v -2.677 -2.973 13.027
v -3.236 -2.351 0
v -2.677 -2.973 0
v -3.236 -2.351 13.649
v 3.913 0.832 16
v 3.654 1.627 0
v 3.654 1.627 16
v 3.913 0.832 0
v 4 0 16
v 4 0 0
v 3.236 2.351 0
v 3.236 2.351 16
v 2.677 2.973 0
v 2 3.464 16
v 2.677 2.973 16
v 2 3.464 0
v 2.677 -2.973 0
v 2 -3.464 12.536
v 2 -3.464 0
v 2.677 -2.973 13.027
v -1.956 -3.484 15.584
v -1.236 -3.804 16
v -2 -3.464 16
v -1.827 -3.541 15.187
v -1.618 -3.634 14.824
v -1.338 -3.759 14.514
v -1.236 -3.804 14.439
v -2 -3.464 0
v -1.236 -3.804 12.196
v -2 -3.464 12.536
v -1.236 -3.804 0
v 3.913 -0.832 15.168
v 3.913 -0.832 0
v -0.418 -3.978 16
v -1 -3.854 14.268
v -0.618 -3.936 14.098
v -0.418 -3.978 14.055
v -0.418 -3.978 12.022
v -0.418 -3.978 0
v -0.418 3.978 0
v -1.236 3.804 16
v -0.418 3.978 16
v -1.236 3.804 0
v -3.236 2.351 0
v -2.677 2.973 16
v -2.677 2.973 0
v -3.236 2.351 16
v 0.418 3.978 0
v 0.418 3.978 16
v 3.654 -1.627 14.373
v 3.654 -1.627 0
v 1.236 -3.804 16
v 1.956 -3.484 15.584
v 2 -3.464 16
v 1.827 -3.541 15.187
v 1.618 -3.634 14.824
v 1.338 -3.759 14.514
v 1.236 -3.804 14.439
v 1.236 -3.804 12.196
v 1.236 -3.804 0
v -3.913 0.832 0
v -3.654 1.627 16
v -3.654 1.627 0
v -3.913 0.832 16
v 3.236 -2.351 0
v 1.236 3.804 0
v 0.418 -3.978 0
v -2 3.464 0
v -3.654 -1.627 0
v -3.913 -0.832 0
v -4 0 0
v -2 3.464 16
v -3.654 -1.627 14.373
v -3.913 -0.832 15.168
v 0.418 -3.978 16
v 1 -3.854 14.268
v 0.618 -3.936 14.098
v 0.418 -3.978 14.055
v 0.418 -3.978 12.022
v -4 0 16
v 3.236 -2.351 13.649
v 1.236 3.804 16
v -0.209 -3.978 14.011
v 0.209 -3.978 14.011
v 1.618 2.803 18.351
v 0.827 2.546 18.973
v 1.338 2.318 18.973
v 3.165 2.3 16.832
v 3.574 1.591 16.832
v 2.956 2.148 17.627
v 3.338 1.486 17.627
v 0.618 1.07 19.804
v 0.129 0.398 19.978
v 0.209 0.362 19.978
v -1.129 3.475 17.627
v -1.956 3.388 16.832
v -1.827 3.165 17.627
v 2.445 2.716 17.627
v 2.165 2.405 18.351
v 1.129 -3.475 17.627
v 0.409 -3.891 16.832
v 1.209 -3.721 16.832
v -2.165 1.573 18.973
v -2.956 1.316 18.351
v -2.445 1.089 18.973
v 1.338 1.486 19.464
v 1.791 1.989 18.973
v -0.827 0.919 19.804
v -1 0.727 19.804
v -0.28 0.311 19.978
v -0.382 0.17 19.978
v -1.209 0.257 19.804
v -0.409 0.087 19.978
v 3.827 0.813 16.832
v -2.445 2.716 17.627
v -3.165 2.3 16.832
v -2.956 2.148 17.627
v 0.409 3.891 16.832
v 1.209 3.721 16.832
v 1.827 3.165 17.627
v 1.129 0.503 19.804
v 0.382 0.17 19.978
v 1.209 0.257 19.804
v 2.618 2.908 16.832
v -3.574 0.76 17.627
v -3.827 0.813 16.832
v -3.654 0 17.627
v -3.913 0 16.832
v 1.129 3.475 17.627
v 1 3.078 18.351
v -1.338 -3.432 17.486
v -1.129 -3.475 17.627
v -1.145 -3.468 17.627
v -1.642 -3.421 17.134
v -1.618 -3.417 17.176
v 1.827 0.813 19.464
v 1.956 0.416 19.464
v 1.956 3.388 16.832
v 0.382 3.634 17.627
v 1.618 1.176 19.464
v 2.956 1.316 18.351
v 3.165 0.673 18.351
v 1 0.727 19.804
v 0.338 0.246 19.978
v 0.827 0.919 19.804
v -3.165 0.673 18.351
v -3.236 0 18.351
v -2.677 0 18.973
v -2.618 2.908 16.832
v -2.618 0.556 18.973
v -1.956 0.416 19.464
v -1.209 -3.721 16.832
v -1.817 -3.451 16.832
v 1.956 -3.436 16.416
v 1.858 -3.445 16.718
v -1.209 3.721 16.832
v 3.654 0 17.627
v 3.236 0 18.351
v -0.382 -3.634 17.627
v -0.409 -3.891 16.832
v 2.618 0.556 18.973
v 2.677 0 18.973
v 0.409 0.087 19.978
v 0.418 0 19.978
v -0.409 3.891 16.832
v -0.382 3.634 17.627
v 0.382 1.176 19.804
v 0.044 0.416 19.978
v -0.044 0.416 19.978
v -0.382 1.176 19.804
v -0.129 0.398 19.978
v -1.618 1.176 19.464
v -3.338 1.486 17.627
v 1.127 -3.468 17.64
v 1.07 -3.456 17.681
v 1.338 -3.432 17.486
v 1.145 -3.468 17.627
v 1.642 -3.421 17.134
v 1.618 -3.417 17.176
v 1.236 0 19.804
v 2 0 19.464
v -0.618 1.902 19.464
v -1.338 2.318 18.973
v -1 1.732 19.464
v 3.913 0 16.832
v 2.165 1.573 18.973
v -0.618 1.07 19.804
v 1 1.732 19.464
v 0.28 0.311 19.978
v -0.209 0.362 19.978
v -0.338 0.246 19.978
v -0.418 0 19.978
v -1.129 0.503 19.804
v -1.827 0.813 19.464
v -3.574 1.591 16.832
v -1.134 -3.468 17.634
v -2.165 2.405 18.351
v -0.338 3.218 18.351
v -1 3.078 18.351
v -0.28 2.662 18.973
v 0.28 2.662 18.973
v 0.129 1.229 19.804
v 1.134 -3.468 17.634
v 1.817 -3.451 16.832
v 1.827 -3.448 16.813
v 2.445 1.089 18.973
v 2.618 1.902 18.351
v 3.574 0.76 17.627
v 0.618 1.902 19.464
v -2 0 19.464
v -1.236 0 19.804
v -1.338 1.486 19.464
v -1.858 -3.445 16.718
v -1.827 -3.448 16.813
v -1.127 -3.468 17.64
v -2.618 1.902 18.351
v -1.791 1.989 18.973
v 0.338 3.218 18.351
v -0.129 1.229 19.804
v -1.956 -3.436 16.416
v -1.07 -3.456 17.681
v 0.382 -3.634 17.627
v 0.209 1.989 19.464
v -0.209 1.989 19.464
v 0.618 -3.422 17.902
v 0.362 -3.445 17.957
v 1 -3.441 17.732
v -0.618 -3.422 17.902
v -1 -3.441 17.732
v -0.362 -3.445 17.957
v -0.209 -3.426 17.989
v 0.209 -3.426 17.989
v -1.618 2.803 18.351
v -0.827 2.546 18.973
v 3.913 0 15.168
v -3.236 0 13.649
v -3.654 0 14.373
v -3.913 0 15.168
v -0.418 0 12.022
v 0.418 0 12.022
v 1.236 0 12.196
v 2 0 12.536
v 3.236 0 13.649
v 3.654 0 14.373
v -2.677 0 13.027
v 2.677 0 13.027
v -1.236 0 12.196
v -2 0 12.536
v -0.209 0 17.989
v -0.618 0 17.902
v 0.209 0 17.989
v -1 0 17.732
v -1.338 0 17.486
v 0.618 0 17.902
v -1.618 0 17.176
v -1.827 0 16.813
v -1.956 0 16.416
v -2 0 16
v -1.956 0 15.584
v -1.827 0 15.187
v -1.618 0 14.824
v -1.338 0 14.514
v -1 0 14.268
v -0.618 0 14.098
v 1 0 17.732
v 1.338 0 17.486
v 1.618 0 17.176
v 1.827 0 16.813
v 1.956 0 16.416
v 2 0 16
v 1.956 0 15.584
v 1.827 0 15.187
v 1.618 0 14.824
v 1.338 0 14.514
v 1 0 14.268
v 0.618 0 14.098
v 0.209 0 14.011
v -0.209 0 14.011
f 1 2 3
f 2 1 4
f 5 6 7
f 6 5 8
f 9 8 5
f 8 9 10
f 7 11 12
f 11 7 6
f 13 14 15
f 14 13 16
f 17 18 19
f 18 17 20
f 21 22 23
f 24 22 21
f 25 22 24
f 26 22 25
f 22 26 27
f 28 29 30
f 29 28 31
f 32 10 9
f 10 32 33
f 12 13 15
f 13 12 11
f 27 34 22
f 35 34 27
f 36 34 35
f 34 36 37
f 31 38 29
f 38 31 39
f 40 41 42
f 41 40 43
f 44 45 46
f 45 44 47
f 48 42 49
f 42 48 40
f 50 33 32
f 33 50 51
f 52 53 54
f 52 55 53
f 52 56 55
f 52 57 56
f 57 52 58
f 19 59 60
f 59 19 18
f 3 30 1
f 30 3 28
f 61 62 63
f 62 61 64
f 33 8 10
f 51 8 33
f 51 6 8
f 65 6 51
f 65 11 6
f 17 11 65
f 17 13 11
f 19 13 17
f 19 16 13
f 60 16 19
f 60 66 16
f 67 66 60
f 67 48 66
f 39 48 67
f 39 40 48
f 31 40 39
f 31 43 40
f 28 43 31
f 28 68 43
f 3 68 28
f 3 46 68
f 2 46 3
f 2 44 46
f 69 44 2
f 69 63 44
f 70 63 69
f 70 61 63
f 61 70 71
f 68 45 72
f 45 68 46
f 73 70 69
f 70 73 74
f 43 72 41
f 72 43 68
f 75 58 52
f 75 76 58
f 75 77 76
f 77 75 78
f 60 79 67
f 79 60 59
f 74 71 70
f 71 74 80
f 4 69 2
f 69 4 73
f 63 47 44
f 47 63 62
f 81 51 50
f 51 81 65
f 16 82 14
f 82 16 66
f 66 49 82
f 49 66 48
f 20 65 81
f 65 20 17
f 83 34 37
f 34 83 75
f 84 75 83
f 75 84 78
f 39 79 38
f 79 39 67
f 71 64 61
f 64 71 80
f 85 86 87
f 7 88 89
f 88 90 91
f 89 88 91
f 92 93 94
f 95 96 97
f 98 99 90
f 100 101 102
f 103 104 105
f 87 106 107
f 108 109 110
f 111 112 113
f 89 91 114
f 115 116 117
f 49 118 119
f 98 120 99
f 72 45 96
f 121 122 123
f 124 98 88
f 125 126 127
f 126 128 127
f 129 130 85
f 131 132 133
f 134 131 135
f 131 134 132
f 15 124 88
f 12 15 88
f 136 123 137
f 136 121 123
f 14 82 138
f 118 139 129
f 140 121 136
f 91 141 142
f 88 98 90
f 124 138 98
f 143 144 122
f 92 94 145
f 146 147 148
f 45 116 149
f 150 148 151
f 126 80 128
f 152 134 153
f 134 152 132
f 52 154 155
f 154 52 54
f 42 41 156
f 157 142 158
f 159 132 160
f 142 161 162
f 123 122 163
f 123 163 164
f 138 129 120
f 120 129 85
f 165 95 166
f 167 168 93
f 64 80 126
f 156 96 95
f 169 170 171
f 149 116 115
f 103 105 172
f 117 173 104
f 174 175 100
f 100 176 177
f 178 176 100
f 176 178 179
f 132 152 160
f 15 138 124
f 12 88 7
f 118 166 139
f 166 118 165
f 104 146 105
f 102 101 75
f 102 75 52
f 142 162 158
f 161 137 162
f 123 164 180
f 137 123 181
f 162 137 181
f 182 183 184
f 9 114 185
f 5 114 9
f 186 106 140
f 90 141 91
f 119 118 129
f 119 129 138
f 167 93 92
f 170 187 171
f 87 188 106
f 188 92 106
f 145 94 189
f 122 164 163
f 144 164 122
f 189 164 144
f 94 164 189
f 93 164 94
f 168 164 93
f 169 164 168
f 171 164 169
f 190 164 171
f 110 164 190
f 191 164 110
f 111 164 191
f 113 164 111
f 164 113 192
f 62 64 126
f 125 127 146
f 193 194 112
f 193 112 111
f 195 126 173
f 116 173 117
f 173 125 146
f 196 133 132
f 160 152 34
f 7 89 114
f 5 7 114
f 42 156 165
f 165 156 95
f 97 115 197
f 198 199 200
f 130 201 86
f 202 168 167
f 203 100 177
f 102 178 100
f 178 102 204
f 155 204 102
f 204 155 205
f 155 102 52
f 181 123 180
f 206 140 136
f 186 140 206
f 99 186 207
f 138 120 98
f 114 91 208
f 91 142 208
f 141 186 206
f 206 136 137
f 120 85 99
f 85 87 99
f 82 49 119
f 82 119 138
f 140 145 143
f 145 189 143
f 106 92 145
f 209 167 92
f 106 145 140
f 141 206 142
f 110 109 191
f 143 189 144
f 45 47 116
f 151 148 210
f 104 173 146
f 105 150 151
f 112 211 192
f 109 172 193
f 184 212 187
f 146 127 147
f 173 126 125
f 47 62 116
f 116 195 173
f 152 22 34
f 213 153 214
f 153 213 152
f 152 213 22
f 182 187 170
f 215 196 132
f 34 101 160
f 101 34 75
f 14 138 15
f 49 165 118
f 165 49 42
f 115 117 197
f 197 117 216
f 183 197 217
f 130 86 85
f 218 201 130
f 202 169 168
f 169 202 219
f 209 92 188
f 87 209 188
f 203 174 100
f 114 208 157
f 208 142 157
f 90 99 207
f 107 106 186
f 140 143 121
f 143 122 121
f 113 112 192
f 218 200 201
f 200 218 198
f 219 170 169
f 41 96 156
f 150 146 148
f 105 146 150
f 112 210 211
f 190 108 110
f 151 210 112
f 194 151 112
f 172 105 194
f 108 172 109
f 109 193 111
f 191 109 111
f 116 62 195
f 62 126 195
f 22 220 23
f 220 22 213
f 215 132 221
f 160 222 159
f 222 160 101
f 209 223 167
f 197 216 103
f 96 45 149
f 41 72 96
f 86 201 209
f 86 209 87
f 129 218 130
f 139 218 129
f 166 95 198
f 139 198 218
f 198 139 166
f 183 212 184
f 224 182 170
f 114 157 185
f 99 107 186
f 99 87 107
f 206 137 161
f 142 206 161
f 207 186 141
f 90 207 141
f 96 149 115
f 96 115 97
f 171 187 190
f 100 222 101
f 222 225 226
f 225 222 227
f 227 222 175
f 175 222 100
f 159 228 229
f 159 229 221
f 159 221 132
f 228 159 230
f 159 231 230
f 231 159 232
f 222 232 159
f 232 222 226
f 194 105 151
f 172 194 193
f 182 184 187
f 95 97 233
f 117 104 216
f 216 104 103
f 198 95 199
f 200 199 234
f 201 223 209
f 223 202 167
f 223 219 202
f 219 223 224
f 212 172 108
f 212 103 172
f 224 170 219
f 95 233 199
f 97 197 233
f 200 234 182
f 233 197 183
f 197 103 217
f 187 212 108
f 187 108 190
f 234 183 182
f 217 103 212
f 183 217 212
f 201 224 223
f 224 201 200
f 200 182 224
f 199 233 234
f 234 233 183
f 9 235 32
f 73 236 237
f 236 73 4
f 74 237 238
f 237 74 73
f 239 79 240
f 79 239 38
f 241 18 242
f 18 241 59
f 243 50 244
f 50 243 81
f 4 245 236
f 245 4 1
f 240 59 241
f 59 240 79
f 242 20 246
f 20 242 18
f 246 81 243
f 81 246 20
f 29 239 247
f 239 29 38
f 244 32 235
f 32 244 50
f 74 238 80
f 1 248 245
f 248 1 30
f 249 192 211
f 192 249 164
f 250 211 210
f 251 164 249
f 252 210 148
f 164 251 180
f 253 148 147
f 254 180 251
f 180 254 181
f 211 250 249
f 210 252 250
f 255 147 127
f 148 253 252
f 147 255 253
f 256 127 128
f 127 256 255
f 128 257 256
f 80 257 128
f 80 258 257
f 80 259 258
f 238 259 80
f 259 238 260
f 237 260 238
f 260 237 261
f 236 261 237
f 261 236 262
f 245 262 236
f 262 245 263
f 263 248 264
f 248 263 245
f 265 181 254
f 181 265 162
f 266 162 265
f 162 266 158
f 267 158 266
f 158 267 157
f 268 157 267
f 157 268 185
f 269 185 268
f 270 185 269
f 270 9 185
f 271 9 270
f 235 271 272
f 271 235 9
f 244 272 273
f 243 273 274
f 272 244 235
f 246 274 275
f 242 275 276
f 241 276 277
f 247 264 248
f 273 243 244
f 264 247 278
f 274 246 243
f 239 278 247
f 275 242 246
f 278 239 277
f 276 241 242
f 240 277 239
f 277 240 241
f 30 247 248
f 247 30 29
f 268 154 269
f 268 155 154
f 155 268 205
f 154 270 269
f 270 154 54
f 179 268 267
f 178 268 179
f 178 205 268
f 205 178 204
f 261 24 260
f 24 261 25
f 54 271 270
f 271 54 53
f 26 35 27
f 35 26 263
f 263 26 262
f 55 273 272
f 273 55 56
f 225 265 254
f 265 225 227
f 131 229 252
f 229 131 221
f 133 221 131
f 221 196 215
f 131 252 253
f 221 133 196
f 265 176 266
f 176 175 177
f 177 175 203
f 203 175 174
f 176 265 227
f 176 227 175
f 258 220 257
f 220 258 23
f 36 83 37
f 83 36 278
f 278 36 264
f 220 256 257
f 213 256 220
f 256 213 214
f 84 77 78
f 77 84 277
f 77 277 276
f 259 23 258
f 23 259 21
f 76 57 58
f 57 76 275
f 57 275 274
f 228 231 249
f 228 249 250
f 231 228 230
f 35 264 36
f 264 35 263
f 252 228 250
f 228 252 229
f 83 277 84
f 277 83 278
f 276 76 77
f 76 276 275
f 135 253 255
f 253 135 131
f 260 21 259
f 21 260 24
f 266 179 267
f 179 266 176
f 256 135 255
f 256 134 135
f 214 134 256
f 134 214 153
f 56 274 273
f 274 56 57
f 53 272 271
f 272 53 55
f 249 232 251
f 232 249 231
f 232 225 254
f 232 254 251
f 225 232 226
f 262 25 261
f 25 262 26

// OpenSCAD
$fn = 30;

module mould_void(inner_radius = 2, outer_radius = 4, length = 20) {
    difference() {
        union() {
            cylinder(r = outer_radius, h = length - outer_radius, $fn = $fn);
            translate([0,0, length - outer_radius]) {
                sphere(r = outer_radius, $fn = $fn);
            }
        }
        translate([0, 0, length - outer_radius]) rotate([90, 0, 0]) {
            difference() {
                cylinder(r = outer_radius, h = outer_radius);
                cylinder(r = inner_radius, h = outer_radius);
            }
        }
    }
}

mould_void();
